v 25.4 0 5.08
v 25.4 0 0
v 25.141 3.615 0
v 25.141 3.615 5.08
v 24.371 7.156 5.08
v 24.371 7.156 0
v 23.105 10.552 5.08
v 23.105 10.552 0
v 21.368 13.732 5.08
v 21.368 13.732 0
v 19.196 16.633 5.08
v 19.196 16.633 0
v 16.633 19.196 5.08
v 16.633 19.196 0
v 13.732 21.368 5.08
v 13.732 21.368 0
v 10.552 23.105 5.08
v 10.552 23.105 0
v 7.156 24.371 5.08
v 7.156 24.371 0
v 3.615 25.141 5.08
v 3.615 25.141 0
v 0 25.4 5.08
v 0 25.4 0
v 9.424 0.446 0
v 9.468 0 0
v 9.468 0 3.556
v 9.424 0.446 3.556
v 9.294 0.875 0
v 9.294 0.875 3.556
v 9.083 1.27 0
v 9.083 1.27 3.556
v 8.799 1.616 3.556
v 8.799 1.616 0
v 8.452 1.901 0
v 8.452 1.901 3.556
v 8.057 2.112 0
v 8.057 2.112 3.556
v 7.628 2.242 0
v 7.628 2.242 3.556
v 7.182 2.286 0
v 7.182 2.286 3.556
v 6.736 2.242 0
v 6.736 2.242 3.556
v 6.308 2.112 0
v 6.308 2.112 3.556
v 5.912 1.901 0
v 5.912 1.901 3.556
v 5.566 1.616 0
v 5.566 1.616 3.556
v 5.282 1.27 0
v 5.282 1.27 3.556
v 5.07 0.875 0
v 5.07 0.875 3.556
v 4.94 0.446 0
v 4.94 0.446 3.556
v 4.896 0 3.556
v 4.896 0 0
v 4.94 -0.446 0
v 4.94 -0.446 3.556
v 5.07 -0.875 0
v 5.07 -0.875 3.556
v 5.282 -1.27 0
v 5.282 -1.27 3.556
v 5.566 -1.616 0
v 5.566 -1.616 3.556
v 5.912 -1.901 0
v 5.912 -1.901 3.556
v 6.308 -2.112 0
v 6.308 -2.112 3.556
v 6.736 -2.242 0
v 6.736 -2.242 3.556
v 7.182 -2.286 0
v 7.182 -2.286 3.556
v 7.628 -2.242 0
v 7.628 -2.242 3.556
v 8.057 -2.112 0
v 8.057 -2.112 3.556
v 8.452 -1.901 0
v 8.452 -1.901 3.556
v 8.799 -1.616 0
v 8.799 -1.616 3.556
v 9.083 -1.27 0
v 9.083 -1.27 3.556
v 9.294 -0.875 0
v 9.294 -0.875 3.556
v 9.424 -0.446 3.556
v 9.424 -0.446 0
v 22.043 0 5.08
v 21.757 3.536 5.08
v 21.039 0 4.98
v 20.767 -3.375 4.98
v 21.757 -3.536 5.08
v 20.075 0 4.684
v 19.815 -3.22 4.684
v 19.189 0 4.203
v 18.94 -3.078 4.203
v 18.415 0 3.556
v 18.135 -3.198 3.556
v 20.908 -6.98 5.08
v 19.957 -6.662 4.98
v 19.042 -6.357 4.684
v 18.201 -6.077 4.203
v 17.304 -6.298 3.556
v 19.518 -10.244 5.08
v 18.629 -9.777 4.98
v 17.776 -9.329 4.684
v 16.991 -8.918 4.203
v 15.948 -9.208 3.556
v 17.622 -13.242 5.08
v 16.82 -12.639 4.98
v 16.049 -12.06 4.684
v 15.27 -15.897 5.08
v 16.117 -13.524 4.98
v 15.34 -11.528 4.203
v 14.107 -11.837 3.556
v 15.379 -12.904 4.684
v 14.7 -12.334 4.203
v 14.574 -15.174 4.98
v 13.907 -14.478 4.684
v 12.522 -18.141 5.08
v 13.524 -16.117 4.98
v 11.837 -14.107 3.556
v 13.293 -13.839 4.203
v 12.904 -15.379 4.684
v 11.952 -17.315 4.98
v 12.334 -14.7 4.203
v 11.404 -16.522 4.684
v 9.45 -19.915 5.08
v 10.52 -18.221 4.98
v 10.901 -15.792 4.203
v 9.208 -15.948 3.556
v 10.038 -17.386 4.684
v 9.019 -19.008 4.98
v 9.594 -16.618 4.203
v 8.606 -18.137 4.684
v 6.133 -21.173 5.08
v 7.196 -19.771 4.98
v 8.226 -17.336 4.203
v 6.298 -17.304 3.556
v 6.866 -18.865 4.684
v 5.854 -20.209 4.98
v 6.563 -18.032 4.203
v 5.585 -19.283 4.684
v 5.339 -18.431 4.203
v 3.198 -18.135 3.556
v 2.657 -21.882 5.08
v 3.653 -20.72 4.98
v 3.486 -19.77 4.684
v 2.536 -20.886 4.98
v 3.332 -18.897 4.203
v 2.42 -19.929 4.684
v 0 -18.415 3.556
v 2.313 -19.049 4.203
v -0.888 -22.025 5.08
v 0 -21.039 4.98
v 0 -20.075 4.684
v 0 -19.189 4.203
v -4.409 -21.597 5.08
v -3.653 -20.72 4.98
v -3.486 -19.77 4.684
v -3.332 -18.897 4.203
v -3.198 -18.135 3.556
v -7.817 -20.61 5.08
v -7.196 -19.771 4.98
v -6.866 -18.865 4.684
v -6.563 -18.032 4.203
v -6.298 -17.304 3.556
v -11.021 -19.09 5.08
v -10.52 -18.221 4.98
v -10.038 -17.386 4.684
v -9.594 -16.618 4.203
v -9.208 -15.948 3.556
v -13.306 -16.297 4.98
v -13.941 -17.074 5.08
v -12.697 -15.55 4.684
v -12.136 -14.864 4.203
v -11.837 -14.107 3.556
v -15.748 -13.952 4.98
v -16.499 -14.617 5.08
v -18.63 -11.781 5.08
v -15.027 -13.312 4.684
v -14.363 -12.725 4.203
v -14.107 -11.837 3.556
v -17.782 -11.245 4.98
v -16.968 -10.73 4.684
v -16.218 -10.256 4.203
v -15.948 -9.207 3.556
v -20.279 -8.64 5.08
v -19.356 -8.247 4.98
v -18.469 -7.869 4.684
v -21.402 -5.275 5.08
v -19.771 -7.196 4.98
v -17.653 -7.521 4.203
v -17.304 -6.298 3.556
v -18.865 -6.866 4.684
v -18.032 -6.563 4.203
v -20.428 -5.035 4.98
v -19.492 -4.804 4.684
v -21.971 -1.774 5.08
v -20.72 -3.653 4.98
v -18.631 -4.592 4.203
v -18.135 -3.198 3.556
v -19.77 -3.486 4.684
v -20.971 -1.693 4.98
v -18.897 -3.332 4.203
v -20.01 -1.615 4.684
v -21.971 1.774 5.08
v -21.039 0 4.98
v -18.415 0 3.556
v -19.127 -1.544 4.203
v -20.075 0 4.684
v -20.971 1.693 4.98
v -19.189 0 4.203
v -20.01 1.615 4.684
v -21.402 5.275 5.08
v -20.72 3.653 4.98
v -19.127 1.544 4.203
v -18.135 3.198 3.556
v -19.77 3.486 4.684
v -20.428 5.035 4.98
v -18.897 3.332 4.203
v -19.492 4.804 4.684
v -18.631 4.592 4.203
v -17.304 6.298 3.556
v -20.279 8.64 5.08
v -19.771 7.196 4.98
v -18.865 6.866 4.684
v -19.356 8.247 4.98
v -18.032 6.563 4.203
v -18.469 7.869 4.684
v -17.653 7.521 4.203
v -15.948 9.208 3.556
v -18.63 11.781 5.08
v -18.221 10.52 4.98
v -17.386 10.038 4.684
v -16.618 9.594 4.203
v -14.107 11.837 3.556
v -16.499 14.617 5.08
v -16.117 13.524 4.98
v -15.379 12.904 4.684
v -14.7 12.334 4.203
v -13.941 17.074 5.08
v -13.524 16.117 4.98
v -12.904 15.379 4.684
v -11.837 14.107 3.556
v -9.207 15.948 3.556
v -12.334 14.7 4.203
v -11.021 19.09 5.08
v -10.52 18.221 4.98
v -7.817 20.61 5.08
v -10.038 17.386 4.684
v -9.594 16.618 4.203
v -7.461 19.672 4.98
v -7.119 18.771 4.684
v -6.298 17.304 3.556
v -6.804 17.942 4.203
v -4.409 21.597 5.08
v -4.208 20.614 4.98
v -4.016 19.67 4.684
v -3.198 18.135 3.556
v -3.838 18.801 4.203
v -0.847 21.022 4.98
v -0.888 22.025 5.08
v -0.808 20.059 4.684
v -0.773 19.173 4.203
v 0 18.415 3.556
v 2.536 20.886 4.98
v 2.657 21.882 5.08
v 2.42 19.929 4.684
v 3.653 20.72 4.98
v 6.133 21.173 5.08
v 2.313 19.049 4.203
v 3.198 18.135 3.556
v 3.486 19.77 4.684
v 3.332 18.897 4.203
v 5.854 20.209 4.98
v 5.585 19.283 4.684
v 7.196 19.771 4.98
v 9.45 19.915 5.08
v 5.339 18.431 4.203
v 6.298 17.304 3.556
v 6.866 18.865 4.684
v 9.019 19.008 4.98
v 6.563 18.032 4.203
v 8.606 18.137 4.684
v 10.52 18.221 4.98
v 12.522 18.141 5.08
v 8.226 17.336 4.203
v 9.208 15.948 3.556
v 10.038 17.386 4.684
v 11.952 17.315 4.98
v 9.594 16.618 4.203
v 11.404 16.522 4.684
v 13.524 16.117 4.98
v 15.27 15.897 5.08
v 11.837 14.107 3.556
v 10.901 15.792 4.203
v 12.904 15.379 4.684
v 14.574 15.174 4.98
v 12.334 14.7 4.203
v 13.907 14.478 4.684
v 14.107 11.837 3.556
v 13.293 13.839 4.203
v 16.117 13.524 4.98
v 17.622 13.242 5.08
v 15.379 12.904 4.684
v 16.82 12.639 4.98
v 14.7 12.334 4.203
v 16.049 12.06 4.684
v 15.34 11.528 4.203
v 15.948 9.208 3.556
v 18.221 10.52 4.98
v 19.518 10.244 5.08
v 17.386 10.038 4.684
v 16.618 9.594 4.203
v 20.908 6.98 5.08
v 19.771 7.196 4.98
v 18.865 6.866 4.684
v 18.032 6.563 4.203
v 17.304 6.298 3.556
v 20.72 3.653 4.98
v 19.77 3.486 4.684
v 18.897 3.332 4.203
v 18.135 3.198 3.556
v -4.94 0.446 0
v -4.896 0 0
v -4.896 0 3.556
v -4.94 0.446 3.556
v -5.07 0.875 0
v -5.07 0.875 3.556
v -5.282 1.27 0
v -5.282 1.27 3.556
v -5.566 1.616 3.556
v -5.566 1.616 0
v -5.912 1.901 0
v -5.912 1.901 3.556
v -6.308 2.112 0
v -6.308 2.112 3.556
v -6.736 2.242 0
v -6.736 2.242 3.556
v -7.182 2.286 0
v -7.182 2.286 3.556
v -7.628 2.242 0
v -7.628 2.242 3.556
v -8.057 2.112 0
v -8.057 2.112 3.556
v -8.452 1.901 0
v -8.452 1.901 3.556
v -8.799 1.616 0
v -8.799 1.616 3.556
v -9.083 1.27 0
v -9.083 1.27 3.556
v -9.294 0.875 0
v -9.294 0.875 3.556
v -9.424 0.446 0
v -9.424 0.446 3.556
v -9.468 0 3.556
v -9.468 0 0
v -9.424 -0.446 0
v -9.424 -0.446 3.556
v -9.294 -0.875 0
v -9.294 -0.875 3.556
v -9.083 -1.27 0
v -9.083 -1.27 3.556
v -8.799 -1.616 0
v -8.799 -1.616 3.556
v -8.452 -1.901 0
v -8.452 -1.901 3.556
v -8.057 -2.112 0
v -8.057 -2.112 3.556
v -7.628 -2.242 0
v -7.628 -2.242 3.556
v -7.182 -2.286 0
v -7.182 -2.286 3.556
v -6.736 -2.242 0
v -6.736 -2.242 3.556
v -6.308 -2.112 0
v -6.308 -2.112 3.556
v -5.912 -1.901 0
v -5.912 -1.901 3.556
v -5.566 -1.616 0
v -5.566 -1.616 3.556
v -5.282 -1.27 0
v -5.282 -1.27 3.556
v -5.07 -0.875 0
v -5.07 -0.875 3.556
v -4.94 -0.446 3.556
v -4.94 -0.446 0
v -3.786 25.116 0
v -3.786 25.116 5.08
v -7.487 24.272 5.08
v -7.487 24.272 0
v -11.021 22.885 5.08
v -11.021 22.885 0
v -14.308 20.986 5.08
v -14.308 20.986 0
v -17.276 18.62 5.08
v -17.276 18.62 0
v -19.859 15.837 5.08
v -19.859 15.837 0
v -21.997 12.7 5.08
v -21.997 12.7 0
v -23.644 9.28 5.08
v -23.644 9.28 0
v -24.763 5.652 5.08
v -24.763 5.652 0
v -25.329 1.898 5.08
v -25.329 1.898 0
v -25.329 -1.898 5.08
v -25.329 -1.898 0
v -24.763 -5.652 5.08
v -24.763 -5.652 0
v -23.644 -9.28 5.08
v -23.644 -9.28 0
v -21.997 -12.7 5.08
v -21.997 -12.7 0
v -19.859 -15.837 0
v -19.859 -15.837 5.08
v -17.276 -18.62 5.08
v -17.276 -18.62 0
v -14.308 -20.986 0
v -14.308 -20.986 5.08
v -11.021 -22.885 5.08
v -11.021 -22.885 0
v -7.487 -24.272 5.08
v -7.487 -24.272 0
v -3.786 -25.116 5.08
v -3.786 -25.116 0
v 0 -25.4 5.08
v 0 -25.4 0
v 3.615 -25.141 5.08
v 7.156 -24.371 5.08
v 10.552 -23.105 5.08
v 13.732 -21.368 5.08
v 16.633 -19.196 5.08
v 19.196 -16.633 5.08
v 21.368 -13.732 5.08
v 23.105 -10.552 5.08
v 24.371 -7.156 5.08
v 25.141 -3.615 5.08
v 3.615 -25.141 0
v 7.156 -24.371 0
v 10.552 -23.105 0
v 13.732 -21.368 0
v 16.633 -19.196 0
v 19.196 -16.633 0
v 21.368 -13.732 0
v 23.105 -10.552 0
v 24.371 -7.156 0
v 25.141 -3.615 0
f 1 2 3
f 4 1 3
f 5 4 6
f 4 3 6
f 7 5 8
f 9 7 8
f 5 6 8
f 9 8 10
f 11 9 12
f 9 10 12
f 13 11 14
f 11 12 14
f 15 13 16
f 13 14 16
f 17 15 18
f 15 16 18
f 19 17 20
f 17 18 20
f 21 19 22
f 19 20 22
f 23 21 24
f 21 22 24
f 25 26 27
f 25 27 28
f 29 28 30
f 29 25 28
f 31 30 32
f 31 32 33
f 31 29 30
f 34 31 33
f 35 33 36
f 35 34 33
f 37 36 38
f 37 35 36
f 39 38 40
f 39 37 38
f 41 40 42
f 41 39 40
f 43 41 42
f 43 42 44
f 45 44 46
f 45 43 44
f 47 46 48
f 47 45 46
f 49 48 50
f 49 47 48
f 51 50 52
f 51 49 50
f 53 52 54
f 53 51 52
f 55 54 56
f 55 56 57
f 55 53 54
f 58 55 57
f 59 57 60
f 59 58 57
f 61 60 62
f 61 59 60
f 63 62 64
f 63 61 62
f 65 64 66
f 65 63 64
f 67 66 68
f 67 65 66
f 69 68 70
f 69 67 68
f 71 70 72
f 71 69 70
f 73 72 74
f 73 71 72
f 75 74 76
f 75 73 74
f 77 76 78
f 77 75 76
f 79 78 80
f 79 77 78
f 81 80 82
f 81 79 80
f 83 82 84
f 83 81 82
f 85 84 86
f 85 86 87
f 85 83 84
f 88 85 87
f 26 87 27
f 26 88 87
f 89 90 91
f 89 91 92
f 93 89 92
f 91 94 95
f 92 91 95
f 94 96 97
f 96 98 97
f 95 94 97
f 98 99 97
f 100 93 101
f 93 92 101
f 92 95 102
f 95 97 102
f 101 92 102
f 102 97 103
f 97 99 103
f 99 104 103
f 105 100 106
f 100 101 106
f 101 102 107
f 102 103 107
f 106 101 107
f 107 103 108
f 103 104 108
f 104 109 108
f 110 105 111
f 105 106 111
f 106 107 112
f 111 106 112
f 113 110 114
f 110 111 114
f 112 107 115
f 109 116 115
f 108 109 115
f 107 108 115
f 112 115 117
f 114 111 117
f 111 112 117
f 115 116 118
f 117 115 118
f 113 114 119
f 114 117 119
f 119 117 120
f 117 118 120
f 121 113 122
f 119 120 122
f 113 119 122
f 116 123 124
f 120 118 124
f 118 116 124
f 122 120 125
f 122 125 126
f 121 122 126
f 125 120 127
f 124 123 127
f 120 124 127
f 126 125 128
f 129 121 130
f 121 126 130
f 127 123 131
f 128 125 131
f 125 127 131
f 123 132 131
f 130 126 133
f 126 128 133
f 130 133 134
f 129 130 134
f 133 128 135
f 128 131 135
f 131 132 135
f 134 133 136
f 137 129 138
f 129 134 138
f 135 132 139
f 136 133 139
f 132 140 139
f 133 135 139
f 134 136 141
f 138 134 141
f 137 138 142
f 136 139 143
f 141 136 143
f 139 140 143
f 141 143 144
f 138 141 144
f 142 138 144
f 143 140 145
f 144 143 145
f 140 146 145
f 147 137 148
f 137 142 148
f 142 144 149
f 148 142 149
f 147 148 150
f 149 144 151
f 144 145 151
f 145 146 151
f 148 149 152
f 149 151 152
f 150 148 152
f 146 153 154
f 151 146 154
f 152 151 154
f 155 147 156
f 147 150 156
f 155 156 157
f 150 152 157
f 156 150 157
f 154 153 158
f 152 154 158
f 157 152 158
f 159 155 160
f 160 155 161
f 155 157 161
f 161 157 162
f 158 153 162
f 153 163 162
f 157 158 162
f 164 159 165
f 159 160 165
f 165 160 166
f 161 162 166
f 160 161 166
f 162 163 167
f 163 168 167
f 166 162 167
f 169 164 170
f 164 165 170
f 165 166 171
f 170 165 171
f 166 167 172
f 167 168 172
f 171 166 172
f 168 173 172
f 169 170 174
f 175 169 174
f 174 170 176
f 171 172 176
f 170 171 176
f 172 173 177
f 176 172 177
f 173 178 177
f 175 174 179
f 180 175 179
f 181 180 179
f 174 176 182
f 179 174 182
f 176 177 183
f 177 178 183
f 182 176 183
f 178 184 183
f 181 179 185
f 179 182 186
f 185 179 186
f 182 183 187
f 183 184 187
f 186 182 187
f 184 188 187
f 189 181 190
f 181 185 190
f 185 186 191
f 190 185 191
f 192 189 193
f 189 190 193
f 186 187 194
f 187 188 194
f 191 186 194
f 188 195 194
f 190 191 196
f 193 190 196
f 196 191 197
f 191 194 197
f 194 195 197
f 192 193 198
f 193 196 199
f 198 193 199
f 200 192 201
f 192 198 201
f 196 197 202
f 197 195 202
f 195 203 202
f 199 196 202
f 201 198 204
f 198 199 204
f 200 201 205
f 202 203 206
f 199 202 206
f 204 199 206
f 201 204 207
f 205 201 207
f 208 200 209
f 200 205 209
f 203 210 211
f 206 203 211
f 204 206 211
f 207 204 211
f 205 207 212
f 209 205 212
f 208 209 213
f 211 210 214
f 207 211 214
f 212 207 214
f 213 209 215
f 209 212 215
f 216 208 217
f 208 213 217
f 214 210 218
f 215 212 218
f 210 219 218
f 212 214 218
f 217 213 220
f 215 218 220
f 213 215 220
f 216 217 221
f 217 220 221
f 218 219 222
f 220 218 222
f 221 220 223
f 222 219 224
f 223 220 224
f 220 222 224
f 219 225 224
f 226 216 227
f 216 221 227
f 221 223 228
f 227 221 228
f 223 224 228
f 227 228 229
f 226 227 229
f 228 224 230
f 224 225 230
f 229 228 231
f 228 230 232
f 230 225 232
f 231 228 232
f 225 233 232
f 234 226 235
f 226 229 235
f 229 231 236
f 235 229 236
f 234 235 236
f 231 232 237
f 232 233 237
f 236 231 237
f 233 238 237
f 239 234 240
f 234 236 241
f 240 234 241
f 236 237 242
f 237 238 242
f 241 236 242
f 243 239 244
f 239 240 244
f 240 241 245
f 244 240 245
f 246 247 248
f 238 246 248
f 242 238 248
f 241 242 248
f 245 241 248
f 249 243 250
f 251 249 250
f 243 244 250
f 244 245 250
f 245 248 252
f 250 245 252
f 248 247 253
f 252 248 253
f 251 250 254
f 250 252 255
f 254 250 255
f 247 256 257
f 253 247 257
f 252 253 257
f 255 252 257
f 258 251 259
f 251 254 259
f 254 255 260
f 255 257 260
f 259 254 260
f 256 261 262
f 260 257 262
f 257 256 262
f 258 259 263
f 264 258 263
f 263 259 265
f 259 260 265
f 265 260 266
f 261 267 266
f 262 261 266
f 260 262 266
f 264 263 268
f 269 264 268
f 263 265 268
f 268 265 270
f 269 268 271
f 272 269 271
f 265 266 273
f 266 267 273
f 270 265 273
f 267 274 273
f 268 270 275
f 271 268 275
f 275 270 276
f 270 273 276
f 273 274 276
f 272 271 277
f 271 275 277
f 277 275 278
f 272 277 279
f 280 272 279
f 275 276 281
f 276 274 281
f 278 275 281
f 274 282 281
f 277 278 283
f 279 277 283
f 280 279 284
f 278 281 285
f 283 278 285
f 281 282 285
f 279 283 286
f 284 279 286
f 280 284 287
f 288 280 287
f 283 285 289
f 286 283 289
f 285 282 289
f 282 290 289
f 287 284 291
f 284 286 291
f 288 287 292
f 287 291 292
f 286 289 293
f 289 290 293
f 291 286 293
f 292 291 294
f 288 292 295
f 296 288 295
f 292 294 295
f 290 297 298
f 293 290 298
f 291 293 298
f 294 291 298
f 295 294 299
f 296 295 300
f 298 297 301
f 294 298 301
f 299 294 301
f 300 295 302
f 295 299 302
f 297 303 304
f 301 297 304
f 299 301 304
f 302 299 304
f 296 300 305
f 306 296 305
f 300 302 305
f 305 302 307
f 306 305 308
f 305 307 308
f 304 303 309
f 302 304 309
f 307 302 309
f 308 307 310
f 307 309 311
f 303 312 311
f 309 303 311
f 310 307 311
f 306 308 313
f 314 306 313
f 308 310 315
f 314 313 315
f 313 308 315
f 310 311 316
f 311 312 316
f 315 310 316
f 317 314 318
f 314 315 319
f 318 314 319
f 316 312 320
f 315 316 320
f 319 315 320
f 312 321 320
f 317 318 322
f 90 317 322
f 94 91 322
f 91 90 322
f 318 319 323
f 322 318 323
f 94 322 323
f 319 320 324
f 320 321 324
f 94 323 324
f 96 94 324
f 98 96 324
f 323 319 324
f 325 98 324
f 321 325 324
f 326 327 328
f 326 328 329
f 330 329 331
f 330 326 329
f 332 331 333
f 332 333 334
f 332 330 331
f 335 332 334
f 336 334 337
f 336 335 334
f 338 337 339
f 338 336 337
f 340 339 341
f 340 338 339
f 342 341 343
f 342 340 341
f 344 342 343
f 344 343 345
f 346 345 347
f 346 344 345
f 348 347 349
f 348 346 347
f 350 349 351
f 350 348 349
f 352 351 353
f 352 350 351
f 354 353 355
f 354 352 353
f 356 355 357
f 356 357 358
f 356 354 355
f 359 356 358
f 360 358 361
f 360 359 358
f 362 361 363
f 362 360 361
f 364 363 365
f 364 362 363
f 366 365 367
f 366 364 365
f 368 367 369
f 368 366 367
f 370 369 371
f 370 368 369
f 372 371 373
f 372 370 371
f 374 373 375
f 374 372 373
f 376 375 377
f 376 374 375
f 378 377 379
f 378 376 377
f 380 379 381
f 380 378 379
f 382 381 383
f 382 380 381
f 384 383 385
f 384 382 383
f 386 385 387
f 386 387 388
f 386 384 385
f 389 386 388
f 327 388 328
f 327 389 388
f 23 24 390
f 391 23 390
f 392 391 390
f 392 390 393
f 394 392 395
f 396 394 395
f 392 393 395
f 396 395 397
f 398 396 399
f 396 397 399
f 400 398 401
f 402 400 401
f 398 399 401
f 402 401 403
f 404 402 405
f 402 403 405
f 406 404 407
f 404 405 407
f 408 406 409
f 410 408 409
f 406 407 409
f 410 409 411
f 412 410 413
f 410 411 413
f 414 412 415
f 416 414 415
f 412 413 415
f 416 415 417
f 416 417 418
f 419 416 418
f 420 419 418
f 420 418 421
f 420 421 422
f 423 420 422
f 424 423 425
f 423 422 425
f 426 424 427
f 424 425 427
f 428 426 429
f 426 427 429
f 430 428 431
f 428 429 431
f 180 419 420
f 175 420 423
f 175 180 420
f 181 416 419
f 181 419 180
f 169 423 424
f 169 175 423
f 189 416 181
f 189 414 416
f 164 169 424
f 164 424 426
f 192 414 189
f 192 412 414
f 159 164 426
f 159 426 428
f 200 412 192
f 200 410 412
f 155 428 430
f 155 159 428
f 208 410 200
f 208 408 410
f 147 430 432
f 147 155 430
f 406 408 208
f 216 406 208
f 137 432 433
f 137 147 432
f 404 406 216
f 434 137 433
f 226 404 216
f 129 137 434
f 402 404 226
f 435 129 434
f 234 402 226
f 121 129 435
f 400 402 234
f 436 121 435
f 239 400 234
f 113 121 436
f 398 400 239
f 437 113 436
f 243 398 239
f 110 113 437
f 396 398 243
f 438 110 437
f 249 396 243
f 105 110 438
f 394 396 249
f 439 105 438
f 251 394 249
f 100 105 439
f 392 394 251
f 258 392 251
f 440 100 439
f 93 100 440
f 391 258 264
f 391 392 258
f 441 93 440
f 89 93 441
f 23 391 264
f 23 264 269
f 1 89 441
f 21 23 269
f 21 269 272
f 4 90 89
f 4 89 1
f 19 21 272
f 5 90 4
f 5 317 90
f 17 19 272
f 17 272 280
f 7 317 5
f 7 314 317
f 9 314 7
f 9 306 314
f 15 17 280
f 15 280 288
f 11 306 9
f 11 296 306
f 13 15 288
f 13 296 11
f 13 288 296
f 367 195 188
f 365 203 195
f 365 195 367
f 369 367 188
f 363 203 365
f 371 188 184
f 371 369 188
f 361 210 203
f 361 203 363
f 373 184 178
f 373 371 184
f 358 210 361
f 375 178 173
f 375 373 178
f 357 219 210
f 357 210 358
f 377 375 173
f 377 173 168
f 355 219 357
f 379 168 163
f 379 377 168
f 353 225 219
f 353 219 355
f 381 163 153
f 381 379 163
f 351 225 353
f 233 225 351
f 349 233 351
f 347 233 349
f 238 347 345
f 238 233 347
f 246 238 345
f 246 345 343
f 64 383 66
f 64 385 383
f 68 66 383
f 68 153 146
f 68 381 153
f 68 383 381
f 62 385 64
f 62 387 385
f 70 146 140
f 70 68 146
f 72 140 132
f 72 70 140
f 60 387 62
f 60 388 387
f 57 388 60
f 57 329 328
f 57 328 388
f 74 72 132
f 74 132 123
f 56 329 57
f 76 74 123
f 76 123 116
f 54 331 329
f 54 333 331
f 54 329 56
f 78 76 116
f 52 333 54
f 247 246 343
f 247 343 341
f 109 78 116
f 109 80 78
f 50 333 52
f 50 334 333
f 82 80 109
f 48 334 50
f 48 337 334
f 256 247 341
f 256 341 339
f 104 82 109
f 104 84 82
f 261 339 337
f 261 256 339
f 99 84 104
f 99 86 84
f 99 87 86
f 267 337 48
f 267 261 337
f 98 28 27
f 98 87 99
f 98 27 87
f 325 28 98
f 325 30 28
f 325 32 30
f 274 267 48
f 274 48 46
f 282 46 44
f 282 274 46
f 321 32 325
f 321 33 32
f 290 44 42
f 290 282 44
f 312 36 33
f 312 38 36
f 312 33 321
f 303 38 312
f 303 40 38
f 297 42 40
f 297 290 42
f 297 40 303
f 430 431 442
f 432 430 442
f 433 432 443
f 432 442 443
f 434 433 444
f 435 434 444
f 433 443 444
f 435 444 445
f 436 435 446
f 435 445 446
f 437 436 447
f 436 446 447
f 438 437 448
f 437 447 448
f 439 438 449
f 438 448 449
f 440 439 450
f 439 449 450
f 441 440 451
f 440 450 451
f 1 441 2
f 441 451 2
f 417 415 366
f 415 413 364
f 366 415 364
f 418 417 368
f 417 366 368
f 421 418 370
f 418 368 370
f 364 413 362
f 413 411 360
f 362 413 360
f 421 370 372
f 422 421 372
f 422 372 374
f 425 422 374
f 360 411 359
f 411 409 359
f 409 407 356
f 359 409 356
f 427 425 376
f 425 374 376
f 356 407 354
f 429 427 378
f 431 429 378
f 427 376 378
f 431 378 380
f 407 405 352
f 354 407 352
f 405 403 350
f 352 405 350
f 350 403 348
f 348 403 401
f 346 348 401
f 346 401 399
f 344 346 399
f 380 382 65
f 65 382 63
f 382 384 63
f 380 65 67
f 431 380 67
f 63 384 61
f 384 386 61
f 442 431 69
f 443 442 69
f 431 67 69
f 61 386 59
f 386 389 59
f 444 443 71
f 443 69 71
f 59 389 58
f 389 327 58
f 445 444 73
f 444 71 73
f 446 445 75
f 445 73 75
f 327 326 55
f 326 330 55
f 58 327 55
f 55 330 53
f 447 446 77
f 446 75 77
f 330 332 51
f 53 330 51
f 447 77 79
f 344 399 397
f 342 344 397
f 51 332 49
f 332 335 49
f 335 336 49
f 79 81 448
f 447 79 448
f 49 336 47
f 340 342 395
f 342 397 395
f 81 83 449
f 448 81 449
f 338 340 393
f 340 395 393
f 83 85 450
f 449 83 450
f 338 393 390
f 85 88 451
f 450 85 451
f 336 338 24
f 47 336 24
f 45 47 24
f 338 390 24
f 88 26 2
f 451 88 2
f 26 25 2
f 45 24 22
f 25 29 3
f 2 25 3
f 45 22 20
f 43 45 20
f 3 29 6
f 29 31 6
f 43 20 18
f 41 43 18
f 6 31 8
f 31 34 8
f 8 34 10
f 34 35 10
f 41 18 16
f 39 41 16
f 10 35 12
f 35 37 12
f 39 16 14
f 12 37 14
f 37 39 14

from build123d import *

# Parameters (mm, degrees)
F1_DEPTH = 5.08
F0_R     = 2.286
F2_DEPTH = 3.556


# Not quite as in the source:
# - a fillet or chamfer that OpenCascade refuses, or shapes differently, is made with other operations: its cross-section is extruded or revolved along the edge and cut away or added


with BuildPart() as f1:
    # F0 (on Top) → F1 (new body)
    with BuildSketch(Plane.XY):
        with BuildLine():
            ThreePointArc((0, -25.4), (17.9605122421, -17.9605122421), (25.4, 0))
            ThreePointArc((25.4, 0), (17.9605122421, 17.9605122421), (0, 25.4))
            Line((0, 25.4), (0, 18.415))
            ThreePointArc((0, 18.415), (13.0213713756, 13.0213713756), (18.415, 0))
            ThreePointArc((18.415, 0), (13.0213713756, -13.0213713756), (0, -18.415))
            Line((0, -18.415), (0, -25.4))
        make_face()
        with BuildLine():
            Line((0, 18.415), (0, 25.4))
            ThreePointArc((0, 25.4), (-25.4, 0), (0, -25.4))
            Line((0, -25.4), (0, -18.415))
            ThreePointArc((0, -18.415), (-18.415, 0), (0, 18.415))
        make_face()
    extrude(amount=F1_DEPTH)

    # F0 (on Top) → F2 (join)
    with BuildSketch(Plane.XY):
        with BuildLine():
            Line((0, -18.415), (0, 18.415))
            ThreePointArc((0, 18.415), (-18.415, 0), (0, -18.415))
        make_face()
        with Locations((-7.1823259524, 0)):
            Circle(F0_R, mode=Mode.SUBTRACT)
        with BuildLine():
            ThreePointArc((18.415, 0), (13.0213713756, 13.0213713756), (0, 18.415))
            Line((0, 18.415), (0, -18.415))
            ThreePointArc((0, -18.415), (13.0213713756, -13.0213713756), (18.415, 0))
        make_face()
        with Locations((7.1823259524, 0)):
            Circle(F0_R, mode=Mode.SUBTRACT)
    extrude(amount=F2_DEPTH)

    # F3: fillet of radius 5.08 on 1 edges, made by hand

    # F3_s1 → F3_t2 (revolve, cut)
    with BuildSketch(Plane.XZ):
        with BuildLine():
            ThreePointArc((22.0428456417, 5.08), (20.0753701018, 4.6835285843), (18.415, 3.556))
            Line((18.415, 3.556), (18.415, 5.08))
            Line((18.415, 5.08), (22.0428456417, 5.08))
        make_face()
    revolve(axis=Axis((0, 0, 5.08), (0, 0, -1)), mode=Mode.SUBTRACT)


solid = f1.part
